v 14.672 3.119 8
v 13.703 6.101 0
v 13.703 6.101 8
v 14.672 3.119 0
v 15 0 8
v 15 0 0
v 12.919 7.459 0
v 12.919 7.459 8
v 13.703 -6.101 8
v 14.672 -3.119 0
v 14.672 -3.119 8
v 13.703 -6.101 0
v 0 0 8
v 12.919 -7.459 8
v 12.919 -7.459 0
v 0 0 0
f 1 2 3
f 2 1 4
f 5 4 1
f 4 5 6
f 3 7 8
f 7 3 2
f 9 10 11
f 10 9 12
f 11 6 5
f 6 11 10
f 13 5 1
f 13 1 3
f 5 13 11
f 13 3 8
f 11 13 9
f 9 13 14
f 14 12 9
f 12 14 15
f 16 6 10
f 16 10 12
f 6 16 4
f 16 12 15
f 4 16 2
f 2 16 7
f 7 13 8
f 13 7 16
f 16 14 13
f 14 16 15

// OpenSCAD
// BOSL-style pie_slice() - wedge of a cylinder
module pie_slice(ang = 90, h = 10, r = 20) {
    intersection() {
        cylinder(h = h, r = r);
        rotate([0, 0, -ang/2])
            cube([r * 2, r * 2, h]);
        rotate([0, 0, ang/2 - 90])
            cube([r * 2, r * 2, h]);
    }
}

pie_slice(ang = 120, h = 8, r = 15);
